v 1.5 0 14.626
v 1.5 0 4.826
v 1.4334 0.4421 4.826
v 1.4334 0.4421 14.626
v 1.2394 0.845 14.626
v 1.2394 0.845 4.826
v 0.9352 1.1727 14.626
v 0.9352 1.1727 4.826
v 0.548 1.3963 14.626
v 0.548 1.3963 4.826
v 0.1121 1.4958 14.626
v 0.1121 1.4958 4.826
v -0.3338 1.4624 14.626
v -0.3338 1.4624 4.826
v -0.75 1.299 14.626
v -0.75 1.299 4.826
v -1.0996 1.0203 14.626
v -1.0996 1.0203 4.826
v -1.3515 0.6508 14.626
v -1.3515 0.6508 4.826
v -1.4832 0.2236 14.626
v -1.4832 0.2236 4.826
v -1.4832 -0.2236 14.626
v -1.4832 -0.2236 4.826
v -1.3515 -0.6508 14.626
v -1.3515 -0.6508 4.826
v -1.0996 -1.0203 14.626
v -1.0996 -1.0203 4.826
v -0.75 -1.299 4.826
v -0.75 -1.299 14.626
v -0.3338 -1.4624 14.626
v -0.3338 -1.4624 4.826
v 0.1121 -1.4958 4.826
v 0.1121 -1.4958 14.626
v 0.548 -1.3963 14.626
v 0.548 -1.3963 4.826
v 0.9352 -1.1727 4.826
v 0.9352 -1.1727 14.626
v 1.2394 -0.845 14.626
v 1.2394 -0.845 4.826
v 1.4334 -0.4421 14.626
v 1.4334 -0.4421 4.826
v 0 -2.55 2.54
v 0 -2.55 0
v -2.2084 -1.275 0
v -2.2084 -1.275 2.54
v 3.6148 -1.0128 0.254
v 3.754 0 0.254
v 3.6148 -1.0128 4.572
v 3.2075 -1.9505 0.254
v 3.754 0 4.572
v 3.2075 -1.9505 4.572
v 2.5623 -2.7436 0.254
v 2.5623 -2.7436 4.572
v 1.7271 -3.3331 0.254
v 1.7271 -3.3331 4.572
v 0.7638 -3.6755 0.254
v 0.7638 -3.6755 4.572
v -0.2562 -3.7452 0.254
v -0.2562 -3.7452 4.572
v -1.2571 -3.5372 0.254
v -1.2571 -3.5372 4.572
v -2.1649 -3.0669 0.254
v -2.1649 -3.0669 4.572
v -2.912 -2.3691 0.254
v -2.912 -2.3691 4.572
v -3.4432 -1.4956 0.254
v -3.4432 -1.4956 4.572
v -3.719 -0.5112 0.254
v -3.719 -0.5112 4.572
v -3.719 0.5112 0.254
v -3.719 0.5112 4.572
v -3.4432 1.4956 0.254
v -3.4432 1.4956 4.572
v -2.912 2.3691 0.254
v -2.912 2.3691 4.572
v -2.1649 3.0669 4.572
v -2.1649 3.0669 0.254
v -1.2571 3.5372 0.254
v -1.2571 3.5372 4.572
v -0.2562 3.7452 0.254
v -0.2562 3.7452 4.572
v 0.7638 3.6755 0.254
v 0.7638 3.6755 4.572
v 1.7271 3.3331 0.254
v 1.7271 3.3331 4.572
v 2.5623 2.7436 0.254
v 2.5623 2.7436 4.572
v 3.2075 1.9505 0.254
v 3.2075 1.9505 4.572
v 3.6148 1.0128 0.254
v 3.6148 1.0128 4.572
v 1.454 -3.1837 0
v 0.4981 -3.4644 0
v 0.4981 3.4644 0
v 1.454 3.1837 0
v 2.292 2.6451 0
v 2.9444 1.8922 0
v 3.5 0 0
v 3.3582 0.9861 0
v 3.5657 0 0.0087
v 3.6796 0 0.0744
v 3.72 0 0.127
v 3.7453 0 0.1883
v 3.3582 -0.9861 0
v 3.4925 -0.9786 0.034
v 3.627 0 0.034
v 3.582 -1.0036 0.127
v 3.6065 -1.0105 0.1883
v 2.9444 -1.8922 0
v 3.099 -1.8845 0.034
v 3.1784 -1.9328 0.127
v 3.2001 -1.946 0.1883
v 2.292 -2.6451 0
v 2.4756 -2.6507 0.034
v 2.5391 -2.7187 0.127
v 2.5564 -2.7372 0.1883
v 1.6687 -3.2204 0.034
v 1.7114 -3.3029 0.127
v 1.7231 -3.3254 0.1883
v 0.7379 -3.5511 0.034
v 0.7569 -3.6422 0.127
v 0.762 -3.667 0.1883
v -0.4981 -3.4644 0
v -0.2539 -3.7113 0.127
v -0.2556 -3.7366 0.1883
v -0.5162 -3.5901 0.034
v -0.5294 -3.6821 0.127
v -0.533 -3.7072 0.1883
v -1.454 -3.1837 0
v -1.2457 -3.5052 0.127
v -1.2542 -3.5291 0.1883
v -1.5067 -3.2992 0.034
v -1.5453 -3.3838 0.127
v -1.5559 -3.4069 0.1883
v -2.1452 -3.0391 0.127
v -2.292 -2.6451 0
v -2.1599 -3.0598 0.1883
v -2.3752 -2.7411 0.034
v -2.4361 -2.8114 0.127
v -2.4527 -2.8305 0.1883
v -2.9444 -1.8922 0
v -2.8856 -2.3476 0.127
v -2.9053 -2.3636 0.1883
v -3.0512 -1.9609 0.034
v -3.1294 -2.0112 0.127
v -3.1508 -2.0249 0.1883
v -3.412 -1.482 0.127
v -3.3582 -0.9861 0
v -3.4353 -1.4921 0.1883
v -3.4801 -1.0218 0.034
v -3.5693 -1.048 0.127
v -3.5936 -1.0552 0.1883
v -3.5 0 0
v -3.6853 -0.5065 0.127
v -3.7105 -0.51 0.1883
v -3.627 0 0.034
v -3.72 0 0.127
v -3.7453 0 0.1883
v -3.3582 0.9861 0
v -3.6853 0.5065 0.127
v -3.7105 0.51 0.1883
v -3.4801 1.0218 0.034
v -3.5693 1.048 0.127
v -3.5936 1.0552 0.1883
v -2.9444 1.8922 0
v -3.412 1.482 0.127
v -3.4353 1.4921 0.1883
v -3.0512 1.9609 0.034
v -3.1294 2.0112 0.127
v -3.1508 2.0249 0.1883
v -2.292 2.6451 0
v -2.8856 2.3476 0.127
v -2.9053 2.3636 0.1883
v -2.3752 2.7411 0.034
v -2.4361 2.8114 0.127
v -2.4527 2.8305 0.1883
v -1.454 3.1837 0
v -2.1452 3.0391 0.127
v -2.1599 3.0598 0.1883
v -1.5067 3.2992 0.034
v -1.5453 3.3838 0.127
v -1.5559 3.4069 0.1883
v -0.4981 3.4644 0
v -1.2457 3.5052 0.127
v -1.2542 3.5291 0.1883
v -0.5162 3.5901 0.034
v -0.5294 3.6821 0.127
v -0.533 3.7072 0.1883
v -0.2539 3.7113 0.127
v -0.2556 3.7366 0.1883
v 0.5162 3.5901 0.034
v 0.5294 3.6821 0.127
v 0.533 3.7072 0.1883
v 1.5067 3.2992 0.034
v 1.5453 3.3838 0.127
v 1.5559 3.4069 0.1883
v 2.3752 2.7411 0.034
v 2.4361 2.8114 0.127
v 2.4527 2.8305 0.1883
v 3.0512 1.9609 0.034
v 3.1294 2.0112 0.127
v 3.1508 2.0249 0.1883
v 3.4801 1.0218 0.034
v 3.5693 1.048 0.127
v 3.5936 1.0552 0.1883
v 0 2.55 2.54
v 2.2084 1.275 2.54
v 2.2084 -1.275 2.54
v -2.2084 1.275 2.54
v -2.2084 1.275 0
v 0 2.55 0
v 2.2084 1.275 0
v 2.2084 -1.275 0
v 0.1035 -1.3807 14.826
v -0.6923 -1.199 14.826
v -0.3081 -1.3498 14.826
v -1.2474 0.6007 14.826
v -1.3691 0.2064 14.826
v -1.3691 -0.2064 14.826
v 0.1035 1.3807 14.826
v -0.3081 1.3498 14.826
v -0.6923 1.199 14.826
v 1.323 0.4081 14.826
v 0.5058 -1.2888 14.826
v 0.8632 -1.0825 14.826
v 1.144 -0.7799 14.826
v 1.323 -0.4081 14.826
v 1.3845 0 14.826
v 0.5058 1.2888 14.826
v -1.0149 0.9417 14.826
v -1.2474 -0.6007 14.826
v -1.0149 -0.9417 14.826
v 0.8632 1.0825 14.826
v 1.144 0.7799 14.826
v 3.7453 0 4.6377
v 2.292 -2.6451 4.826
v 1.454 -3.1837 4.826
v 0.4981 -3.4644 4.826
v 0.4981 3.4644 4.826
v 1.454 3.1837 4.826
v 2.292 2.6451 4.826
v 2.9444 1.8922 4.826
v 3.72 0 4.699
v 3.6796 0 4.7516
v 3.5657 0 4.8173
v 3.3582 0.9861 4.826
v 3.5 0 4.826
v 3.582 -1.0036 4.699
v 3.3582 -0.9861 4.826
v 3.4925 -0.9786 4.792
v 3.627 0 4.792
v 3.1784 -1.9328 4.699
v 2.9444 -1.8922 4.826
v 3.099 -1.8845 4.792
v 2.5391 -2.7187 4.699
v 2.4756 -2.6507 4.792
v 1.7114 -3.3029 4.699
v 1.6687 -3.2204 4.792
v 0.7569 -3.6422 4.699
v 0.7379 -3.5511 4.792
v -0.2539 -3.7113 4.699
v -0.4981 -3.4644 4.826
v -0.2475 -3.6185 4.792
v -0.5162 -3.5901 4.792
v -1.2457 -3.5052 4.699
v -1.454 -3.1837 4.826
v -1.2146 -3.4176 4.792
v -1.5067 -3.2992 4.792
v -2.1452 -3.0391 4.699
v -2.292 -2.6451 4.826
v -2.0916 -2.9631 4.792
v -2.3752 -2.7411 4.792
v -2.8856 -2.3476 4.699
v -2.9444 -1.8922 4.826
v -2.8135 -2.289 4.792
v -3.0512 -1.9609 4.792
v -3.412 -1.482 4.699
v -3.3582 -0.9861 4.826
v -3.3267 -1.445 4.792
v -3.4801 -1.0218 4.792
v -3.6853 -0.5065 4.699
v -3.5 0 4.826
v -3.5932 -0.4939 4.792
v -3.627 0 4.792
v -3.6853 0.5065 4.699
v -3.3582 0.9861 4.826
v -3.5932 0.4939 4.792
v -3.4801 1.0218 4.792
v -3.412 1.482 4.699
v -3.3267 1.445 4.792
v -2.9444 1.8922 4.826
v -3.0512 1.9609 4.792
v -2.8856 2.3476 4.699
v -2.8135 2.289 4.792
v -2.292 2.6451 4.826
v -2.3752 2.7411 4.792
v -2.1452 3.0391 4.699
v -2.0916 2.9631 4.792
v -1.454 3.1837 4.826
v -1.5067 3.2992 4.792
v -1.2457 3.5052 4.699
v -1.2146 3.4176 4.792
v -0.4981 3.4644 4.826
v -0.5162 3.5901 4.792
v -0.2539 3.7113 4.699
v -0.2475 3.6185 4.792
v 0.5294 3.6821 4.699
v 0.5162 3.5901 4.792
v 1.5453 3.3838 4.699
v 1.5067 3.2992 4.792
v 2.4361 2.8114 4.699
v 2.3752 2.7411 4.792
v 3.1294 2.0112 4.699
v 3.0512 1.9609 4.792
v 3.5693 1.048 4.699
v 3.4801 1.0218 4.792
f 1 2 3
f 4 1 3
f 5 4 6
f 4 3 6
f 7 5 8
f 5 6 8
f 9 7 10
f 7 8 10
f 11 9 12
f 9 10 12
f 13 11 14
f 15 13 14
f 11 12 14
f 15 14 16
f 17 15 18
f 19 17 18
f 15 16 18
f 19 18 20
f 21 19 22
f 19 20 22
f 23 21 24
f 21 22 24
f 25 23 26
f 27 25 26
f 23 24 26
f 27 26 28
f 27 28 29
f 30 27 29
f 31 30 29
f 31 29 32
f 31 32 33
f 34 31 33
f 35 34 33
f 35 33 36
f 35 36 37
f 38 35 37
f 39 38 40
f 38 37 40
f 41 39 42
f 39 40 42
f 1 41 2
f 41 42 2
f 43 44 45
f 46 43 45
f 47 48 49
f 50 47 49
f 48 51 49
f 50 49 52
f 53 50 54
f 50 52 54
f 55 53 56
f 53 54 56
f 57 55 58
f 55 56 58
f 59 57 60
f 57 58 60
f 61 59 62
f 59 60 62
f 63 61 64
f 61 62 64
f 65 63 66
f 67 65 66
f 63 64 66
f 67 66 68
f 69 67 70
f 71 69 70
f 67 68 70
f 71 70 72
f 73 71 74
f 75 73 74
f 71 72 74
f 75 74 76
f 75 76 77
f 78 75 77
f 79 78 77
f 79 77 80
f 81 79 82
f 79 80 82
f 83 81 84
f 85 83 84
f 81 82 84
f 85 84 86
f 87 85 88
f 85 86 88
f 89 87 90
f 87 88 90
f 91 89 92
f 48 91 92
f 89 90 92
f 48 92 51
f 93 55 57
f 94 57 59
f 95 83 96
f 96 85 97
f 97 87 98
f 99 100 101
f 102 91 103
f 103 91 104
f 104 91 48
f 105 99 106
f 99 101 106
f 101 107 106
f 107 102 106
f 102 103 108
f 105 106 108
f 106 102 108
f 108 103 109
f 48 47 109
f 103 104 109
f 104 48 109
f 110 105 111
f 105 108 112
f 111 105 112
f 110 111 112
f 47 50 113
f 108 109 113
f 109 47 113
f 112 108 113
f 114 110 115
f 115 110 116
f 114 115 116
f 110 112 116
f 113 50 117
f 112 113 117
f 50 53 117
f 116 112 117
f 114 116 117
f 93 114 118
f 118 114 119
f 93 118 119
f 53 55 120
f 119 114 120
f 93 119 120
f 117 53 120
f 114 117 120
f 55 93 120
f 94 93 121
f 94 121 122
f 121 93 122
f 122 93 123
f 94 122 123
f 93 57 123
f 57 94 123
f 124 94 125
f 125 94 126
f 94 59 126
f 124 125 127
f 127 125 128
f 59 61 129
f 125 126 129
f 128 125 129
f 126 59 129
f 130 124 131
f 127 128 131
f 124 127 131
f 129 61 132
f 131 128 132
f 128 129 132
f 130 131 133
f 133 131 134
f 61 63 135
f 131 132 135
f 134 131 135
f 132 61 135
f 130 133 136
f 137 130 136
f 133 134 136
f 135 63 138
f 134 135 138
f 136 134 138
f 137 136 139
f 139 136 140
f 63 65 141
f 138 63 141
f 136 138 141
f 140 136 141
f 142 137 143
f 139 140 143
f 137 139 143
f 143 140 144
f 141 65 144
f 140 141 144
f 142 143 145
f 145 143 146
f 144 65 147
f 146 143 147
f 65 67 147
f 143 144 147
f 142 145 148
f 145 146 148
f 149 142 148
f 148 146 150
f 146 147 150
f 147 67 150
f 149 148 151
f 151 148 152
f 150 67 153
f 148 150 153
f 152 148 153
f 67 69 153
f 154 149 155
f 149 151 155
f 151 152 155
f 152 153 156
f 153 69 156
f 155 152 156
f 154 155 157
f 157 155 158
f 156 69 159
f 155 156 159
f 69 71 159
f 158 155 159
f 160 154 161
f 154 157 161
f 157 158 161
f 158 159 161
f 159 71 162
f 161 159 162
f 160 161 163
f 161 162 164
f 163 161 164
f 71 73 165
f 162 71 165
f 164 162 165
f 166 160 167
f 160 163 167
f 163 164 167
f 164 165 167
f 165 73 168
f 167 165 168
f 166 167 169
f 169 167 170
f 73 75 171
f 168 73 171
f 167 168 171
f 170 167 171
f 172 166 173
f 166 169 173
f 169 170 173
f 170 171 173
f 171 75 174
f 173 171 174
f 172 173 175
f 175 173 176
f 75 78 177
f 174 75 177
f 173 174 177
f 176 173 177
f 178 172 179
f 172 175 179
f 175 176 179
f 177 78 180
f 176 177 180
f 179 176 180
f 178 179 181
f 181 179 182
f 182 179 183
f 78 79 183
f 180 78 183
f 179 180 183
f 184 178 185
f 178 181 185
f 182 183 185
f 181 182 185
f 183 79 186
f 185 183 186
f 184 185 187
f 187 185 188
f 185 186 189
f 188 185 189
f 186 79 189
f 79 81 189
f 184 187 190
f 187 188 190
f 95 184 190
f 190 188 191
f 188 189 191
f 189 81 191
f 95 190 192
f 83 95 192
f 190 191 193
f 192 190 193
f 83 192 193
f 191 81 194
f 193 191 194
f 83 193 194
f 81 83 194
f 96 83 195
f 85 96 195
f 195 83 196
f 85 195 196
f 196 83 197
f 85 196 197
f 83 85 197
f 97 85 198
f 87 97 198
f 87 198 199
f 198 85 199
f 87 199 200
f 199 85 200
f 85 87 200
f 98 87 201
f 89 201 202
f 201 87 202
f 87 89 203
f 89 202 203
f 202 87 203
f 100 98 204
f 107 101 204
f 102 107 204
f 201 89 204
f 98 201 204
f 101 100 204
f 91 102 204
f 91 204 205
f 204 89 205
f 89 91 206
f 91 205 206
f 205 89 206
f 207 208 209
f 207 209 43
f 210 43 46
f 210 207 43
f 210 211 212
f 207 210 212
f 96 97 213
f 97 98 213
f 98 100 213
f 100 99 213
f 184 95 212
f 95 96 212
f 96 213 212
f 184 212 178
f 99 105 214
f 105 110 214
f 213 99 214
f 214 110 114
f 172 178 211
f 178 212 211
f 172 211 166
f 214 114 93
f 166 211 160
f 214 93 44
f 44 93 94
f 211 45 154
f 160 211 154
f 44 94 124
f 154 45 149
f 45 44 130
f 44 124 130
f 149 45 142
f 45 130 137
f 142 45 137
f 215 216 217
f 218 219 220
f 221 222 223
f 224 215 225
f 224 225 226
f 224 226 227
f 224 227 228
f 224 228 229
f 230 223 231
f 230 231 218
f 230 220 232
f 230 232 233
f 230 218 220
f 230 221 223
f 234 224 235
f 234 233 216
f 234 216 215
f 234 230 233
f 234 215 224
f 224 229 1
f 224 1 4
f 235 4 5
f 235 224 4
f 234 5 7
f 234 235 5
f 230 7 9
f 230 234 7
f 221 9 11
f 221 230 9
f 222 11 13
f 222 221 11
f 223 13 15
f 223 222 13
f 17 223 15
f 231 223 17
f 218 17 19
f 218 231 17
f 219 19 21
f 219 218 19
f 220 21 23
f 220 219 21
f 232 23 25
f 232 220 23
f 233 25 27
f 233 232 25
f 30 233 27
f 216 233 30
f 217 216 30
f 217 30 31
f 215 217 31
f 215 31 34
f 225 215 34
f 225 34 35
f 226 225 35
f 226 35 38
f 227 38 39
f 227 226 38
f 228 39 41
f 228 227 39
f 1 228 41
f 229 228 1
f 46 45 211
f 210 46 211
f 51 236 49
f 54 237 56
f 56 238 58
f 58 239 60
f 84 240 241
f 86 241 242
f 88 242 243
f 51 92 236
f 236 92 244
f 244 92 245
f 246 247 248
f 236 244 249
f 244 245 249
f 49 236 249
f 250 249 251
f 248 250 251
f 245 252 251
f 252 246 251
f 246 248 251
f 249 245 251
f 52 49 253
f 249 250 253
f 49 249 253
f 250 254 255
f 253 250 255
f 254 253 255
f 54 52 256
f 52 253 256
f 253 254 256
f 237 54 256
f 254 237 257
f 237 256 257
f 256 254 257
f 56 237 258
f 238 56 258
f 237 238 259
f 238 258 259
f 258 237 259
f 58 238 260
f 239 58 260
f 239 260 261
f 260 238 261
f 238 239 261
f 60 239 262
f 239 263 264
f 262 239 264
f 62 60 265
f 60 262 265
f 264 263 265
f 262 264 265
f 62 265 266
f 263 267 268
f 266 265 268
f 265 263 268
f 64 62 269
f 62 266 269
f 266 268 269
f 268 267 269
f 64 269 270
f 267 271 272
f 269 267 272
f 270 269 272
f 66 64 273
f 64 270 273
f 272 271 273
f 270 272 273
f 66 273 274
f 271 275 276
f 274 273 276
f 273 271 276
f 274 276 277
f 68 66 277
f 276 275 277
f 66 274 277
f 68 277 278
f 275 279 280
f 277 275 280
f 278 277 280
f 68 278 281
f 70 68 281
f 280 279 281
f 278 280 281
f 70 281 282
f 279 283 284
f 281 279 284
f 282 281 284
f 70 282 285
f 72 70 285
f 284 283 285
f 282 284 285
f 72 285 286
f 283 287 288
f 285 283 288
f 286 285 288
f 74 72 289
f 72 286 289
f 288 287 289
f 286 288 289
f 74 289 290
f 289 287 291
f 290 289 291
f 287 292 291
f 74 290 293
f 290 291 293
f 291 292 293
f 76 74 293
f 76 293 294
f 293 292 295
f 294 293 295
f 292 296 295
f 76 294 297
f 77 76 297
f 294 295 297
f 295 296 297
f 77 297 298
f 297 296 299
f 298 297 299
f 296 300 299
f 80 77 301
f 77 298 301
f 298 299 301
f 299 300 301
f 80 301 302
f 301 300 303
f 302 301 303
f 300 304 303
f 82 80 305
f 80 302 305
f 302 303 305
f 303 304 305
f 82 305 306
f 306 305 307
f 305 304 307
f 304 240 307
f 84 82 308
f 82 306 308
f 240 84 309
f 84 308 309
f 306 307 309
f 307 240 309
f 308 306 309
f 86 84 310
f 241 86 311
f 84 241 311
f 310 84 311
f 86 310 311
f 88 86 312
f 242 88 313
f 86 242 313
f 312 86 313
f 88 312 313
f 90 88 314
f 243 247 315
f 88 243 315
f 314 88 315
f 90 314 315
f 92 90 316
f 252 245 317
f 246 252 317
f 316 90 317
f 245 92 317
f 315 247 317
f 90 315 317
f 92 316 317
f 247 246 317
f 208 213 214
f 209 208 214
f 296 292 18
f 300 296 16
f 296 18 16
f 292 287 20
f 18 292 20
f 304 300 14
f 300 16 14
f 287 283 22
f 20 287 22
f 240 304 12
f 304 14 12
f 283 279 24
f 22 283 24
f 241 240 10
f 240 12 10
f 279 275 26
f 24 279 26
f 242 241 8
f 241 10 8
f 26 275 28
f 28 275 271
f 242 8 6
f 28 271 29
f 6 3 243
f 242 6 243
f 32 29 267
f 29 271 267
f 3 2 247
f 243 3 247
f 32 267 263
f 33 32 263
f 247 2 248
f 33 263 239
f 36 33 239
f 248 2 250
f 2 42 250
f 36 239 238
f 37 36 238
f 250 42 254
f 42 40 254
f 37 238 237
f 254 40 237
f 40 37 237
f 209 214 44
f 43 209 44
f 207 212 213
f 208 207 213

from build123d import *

# Parameters (mm, degrees)
CUT_EXTRUDE1_DEPTH  = 2.54
SKETCH3_R           = 1.5
BOSS_EXTRUDE1_DEPTH = 10
CHAMFER1_SIZE       = 0.2
CHAMFER1_SIZE2      = 0.115470054


with BuildPart() as part:
    # Sketch1 → Revolve1 (revolve)
    with BuildSketch(Plane(origin=(0, 0, 0), x_dir=(1, 0, 0), z_dir=(0, 1, 0))):
        with BuildLine():
            Line((0, 0), (3.5, 0))
            ThreePointArc((3.5, 0), (3.679605122, -0.074394878), (3.754, -0.254))
            Line((3.754, -0.254), (3.754, -4.572))
            ThreePointArc((3.754, -4.572), (3.679605122, -4.751605122), (3.5, -4.826))
            Line((3.5, -4.826), (0, -4.826))
            Line((0, -4.826), (0, 0))
        make_face()
    revolve(axis=Axis((0, 0, 0), (0, 0, -1)))

    # Sketch2 → Cut-Extrude1 (cut)
    with BuildSketch(Plane(origin=(0, 0, 0), x_dir=(-1, 0, 0), z_dir=(0, 0, -1))):
        Polygon((0, 2.55), (-2.20836478, 1.275), (-2.20836478, -1.275), (0, -2.55), (2.20836478, -1.275), (2.20836478, 1.275), align=None)
    extrude(amount=-CUT_EXTRUDE1_DEPTH, mode=Mode.SUBTRACT)

    # Sketch3 → Boss-Extrude1 (add)
    with BuildSketch(Plane.XY.offset(4.826)):
        Circle(SKETCH3_R)
    extrude(amount=BOSS_EXTRUDE1_DEPTH)

    # Chamfer1
    chamfer1_edges = [part.edges().sort_by_distance(p)[0] for p in [
        (-1.5, 0, 14.826),
    ]]
    chamfer1_side = [part.faces().sort_by_distance(p)[0] for p in [
        (-1.5, 0, 9.826),
    ]]
    chamfer(chamfer1_edges, length=CHAMFER1_SIZE, length2=CHAMFER1_SIZE2, reference=chamfer1_side[0])


solid = part.part
